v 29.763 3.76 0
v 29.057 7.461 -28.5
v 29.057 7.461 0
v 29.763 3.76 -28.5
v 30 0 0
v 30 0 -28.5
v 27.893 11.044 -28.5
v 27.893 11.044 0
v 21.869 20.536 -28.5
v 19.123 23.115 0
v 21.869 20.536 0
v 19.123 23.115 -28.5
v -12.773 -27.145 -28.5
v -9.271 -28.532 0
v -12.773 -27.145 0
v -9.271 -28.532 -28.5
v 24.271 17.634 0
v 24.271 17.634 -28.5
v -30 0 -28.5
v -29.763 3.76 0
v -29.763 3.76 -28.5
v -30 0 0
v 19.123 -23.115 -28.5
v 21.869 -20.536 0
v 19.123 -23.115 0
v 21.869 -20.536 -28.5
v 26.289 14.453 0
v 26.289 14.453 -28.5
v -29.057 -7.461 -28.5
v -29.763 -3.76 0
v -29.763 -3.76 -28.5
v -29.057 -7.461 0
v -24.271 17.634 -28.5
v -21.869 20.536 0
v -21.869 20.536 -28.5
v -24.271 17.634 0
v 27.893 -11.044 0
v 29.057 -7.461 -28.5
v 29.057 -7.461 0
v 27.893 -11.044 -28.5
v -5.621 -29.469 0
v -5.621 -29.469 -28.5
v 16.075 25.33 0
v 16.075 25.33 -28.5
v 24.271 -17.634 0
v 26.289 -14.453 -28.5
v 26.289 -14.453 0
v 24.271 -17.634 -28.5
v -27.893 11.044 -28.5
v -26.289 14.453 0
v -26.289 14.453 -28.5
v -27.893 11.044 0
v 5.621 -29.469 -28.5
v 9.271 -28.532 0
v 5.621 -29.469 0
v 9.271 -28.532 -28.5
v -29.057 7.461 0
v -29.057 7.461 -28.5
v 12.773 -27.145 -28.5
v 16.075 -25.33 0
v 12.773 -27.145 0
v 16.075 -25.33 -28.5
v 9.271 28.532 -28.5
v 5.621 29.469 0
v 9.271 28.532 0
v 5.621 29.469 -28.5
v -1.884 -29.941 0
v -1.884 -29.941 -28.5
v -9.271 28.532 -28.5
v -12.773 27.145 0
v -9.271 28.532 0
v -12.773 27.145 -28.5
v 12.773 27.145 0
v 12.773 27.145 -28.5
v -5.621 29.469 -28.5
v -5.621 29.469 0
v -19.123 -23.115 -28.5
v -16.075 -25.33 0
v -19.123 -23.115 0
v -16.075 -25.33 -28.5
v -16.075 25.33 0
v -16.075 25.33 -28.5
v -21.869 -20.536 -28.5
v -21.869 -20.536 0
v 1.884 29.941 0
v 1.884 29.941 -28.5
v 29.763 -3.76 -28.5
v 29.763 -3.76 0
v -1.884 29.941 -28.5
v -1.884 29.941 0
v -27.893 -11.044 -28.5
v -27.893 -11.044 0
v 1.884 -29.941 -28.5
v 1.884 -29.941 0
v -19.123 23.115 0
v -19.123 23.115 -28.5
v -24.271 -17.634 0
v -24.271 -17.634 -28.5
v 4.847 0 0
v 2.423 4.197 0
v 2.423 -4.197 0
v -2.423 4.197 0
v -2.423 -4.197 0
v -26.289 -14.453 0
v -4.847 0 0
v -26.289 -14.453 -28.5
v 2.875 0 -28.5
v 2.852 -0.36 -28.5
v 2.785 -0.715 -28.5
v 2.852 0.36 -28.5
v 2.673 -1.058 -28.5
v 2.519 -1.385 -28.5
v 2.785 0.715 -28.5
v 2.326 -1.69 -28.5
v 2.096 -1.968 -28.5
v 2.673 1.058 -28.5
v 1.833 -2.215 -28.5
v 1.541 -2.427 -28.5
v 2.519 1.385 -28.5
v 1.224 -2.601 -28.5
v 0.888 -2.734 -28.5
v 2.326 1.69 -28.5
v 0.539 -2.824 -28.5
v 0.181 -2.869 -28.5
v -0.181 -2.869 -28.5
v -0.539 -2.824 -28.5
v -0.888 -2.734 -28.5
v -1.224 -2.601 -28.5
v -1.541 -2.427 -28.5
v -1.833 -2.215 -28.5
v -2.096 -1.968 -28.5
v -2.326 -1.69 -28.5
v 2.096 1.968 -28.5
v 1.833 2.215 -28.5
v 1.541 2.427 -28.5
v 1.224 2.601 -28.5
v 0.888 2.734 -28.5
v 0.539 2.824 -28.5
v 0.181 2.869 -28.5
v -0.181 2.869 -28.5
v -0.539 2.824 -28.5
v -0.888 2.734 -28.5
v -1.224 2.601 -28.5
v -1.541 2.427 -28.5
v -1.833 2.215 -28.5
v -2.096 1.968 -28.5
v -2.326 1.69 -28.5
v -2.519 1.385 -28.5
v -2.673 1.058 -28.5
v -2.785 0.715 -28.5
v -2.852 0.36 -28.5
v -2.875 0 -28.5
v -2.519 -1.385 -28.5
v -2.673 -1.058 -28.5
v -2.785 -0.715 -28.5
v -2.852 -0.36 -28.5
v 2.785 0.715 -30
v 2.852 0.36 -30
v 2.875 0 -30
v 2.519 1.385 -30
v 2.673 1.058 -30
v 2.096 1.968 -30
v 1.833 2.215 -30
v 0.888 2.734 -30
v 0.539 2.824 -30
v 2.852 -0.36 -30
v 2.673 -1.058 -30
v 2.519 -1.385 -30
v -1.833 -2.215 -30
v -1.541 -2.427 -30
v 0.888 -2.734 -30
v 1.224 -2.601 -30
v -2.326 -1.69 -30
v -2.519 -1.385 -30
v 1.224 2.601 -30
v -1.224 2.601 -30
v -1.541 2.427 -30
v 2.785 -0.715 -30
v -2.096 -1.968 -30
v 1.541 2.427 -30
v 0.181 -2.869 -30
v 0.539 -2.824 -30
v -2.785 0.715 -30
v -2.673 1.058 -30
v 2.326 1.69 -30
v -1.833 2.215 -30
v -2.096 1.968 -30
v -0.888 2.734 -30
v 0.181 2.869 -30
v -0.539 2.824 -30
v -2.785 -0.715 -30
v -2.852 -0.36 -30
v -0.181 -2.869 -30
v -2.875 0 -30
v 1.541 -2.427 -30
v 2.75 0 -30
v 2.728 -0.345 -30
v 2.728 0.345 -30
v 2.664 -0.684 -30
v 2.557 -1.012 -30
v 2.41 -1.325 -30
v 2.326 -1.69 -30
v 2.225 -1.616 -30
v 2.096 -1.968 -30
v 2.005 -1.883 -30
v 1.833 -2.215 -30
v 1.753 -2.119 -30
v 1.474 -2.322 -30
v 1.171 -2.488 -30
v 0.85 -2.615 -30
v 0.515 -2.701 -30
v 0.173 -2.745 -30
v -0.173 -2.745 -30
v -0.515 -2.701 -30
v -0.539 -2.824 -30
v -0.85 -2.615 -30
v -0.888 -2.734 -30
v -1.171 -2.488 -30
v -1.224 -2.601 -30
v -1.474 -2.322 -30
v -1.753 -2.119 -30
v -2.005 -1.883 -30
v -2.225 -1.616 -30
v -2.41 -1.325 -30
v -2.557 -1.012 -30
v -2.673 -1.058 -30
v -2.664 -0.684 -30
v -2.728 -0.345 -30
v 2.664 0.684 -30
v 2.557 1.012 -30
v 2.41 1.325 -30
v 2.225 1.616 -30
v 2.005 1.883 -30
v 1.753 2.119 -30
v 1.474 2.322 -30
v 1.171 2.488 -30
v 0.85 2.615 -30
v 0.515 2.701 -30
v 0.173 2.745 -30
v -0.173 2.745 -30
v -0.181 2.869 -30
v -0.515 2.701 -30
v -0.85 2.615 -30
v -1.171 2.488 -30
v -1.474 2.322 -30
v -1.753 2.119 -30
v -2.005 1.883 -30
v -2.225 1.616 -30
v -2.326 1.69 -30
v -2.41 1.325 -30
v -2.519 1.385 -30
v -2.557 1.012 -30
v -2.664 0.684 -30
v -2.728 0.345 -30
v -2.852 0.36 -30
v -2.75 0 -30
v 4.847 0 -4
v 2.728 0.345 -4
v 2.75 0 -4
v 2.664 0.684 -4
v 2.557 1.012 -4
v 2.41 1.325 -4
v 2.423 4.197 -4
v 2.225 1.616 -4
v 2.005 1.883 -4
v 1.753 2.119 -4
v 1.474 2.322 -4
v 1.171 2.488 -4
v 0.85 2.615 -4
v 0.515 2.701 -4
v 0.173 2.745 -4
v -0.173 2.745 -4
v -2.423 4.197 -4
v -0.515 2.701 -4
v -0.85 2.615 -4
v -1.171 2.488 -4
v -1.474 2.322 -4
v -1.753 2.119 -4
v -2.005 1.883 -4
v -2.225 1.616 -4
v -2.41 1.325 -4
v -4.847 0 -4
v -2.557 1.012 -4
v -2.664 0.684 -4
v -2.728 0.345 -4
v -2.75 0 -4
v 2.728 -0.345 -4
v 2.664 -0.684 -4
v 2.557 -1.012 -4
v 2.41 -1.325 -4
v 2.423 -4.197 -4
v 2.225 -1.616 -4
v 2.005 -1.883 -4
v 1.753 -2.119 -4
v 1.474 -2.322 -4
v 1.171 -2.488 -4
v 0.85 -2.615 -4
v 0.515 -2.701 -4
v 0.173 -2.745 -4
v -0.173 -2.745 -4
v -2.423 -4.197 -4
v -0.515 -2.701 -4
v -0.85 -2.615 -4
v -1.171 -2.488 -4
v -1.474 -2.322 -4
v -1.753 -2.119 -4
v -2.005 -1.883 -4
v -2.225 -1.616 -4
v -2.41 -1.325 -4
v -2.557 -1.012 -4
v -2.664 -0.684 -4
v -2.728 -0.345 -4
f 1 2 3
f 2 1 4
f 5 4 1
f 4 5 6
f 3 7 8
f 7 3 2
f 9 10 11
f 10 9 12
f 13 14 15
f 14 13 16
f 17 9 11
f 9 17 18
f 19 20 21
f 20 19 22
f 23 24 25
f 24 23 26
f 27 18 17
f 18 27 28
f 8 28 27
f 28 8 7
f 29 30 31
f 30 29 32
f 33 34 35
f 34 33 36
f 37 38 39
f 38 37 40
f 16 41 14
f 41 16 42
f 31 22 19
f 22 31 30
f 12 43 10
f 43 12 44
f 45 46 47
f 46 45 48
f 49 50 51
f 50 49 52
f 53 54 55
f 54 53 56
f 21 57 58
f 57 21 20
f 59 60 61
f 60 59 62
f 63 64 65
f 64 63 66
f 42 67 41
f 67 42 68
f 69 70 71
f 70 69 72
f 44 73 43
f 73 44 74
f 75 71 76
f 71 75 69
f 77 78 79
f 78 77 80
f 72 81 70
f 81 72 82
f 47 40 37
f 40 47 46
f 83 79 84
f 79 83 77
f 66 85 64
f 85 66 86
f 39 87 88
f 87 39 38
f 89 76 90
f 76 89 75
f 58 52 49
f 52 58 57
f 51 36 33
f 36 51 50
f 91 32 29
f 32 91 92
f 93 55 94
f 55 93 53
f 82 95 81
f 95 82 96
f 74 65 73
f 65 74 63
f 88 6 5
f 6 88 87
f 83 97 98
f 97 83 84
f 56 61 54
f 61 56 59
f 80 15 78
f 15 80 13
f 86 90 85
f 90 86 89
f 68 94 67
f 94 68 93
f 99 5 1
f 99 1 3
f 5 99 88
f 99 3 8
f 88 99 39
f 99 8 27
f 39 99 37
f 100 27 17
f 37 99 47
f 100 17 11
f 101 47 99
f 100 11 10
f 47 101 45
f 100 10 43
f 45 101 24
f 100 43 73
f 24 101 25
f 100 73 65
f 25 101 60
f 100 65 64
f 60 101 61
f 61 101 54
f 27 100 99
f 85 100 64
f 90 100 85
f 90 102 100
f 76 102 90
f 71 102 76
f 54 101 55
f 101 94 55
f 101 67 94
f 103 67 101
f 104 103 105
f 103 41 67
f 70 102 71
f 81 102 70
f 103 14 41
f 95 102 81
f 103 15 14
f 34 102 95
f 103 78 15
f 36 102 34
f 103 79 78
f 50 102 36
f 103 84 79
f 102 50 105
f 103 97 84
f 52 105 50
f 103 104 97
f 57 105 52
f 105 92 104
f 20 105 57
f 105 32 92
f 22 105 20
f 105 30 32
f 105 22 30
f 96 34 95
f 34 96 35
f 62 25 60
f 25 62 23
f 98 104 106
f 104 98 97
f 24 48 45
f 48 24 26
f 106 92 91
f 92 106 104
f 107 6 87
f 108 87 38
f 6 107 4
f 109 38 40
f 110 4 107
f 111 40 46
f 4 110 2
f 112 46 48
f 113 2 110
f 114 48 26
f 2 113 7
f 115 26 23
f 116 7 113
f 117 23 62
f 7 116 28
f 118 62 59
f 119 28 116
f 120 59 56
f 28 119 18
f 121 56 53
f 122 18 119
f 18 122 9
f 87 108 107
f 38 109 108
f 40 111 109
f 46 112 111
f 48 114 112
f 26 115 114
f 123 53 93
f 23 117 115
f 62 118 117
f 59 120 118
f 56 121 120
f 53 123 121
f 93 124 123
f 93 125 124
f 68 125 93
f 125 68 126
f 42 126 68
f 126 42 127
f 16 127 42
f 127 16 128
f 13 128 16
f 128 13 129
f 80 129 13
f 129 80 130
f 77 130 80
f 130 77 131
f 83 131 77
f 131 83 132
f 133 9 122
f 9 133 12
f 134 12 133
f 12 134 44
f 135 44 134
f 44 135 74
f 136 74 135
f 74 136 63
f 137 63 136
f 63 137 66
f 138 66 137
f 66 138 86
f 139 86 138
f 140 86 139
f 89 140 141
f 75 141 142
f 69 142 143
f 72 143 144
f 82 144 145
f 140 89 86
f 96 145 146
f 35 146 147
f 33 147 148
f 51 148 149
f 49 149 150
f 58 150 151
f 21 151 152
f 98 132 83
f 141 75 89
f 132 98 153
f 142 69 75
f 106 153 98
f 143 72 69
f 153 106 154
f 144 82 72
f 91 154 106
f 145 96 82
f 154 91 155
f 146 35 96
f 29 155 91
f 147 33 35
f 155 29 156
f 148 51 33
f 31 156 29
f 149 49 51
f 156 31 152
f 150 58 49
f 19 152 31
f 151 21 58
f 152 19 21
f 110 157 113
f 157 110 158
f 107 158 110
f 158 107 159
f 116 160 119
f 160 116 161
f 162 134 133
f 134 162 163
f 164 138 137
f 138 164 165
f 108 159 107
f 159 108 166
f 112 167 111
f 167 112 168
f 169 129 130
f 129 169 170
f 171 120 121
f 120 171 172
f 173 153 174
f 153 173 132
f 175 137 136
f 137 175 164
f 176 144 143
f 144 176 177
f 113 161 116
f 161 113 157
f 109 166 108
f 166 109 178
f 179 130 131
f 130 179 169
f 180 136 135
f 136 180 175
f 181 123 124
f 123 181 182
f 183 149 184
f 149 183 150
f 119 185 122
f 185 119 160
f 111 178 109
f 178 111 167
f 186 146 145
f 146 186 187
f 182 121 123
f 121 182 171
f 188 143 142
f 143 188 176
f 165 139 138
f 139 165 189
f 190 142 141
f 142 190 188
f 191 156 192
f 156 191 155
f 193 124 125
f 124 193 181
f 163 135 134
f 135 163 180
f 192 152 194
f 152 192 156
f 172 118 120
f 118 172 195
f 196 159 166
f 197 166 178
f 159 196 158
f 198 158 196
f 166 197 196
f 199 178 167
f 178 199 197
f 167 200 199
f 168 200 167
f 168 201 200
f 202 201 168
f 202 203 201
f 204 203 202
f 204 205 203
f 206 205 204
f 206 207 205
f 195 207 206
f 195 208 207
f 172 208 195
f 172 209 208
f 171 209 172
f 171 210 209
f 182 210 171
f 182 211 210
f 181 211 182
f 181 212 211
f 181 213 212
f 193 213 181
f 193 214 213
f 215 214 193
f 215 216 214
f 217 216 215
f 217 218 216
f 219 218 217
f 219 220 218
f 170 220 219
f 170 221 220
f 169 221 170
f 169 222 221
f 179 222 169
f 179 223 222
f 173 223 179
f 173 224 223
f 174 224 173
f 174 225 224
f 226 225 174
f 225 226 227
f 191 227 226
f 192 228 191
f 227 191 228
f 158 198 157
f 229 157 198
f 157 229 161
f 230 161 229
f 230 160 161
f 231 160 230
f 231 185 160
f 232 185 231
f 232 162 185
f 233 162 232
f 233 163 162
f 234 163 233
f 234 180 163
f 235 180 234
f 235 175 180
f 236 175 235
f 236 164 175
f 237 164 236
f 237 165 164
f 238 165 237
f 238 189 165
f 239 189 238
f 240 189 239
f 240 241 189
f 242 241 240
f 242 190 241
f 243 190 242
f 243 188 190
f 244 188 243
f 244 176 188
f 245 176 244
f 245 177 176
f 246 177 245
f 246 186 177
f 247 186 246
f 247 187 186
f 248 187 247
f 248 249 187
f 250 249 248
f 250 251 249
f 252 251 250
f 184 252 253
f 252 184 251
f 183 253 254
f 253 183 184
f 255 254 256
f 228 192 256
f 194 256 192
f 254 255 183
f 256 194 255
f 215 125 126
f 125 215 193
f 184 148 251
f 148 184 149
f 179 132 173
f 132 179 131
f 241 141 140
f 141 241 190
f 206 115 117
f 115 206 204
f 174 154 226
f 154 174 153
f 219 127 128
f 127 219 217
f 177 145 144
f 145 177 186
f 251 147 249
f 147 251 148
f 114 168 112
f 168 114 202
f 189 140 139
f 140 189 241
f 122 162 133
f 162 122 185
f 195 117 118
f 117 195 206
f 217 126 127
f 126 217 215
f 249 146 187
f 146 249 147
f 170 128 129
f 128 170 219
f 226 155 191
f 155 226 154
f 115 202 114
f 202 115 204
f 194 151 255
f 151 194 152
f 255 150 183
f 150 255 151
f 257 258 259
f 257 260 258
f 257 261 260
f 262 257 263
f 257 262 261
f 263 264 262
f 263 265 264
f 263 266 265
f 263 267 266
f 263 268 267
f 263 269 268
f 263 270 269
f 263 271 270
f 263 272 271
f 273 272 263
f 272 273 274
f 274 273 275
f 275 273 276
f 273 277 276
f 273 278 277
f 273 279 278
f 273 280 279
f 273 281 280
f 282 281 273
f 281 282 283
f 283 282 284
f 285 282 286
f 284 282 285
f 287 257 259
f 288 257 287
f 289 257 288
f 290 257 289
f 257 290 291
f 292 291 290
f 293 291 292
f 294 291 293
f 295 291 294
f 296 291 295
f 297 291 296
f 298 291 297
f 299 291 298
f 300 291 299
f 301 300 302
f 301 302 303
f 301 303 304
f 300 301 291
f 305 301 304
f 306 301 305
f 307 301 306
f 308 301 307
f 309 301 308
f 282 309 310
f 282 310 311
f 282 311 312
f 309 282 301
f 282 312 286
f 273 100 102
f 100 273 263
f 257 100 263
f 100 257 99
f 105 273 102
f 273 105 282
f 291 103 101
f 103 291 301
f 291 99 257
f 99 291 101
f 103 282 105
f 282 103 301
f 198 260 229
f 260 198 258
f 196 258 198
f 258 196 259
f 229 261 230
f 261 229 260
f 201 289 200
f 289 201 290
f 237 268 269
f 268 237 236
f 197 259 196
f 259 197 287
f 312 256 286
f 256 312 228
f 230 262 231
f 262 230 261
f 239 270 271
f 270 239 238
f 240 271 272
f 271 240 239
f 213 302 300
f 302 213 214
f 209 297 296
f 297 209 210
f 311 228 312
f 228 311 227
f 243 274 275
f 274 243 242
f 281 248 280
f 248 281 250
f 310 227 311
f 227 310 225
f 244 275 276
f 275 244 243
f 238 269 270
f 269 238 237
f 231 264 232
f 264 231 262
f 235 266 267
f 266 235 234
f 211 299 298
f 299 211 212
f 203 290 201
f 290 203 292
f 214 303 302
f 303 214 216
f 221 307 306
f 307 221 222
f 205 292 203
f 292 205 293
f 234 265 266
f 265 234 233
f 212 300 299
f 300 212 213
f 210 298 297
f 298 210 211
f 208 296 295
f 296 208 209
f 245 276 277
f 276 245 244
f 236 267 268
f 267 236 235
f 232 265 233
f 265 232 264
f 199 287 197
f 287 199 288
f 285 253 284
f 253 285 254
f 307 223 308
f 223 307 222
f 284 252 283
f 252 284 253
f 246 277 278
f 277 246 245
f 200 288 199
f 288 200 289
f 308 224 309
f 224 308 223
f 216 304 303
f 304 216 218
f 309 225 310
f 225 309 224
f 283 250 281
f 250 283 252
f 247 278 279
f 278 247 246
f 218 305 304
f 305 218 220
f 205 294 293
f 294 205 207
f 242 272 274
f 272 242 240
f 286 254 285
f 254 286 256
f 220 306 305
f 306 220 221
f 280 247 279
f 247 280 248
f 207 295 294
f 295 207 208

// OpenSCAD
$fn = 50;

difference() {
	union() {
		translate(v = [0, 0, -28.5]) {
			cylinder(h = 28.5, r = 30.0);
		}
		#translate(v = [0, 0, -30.0]) {
			cylinder(h = 30, r = 2.875);
		}
	}
	union() {
		translate(v = [0, 0, 0]) {
			rotate(a = [0, 0, 0]) {
				difference() {
					union() {
						translate(v = [0, 0, -4]) {
							linear_extrude(height = 4) {
								polygon(points = [[4.8468, 0.0], [2.4234000000000004, 4.197451927062417], [-2.423399999999999, 4.197451927062417], [-4.8468, 5.935618106107392e-16], [-2.423400000000002, -4.197451927062416], [2.423399999999997, -4.197451927062419]]);
							}
						}
					}
					union();
				}
			}
		}
		#translate(v = [0, 0, -100.0]) {
			cylinder(h = 200, r = 2.75);
		}
	}
}
